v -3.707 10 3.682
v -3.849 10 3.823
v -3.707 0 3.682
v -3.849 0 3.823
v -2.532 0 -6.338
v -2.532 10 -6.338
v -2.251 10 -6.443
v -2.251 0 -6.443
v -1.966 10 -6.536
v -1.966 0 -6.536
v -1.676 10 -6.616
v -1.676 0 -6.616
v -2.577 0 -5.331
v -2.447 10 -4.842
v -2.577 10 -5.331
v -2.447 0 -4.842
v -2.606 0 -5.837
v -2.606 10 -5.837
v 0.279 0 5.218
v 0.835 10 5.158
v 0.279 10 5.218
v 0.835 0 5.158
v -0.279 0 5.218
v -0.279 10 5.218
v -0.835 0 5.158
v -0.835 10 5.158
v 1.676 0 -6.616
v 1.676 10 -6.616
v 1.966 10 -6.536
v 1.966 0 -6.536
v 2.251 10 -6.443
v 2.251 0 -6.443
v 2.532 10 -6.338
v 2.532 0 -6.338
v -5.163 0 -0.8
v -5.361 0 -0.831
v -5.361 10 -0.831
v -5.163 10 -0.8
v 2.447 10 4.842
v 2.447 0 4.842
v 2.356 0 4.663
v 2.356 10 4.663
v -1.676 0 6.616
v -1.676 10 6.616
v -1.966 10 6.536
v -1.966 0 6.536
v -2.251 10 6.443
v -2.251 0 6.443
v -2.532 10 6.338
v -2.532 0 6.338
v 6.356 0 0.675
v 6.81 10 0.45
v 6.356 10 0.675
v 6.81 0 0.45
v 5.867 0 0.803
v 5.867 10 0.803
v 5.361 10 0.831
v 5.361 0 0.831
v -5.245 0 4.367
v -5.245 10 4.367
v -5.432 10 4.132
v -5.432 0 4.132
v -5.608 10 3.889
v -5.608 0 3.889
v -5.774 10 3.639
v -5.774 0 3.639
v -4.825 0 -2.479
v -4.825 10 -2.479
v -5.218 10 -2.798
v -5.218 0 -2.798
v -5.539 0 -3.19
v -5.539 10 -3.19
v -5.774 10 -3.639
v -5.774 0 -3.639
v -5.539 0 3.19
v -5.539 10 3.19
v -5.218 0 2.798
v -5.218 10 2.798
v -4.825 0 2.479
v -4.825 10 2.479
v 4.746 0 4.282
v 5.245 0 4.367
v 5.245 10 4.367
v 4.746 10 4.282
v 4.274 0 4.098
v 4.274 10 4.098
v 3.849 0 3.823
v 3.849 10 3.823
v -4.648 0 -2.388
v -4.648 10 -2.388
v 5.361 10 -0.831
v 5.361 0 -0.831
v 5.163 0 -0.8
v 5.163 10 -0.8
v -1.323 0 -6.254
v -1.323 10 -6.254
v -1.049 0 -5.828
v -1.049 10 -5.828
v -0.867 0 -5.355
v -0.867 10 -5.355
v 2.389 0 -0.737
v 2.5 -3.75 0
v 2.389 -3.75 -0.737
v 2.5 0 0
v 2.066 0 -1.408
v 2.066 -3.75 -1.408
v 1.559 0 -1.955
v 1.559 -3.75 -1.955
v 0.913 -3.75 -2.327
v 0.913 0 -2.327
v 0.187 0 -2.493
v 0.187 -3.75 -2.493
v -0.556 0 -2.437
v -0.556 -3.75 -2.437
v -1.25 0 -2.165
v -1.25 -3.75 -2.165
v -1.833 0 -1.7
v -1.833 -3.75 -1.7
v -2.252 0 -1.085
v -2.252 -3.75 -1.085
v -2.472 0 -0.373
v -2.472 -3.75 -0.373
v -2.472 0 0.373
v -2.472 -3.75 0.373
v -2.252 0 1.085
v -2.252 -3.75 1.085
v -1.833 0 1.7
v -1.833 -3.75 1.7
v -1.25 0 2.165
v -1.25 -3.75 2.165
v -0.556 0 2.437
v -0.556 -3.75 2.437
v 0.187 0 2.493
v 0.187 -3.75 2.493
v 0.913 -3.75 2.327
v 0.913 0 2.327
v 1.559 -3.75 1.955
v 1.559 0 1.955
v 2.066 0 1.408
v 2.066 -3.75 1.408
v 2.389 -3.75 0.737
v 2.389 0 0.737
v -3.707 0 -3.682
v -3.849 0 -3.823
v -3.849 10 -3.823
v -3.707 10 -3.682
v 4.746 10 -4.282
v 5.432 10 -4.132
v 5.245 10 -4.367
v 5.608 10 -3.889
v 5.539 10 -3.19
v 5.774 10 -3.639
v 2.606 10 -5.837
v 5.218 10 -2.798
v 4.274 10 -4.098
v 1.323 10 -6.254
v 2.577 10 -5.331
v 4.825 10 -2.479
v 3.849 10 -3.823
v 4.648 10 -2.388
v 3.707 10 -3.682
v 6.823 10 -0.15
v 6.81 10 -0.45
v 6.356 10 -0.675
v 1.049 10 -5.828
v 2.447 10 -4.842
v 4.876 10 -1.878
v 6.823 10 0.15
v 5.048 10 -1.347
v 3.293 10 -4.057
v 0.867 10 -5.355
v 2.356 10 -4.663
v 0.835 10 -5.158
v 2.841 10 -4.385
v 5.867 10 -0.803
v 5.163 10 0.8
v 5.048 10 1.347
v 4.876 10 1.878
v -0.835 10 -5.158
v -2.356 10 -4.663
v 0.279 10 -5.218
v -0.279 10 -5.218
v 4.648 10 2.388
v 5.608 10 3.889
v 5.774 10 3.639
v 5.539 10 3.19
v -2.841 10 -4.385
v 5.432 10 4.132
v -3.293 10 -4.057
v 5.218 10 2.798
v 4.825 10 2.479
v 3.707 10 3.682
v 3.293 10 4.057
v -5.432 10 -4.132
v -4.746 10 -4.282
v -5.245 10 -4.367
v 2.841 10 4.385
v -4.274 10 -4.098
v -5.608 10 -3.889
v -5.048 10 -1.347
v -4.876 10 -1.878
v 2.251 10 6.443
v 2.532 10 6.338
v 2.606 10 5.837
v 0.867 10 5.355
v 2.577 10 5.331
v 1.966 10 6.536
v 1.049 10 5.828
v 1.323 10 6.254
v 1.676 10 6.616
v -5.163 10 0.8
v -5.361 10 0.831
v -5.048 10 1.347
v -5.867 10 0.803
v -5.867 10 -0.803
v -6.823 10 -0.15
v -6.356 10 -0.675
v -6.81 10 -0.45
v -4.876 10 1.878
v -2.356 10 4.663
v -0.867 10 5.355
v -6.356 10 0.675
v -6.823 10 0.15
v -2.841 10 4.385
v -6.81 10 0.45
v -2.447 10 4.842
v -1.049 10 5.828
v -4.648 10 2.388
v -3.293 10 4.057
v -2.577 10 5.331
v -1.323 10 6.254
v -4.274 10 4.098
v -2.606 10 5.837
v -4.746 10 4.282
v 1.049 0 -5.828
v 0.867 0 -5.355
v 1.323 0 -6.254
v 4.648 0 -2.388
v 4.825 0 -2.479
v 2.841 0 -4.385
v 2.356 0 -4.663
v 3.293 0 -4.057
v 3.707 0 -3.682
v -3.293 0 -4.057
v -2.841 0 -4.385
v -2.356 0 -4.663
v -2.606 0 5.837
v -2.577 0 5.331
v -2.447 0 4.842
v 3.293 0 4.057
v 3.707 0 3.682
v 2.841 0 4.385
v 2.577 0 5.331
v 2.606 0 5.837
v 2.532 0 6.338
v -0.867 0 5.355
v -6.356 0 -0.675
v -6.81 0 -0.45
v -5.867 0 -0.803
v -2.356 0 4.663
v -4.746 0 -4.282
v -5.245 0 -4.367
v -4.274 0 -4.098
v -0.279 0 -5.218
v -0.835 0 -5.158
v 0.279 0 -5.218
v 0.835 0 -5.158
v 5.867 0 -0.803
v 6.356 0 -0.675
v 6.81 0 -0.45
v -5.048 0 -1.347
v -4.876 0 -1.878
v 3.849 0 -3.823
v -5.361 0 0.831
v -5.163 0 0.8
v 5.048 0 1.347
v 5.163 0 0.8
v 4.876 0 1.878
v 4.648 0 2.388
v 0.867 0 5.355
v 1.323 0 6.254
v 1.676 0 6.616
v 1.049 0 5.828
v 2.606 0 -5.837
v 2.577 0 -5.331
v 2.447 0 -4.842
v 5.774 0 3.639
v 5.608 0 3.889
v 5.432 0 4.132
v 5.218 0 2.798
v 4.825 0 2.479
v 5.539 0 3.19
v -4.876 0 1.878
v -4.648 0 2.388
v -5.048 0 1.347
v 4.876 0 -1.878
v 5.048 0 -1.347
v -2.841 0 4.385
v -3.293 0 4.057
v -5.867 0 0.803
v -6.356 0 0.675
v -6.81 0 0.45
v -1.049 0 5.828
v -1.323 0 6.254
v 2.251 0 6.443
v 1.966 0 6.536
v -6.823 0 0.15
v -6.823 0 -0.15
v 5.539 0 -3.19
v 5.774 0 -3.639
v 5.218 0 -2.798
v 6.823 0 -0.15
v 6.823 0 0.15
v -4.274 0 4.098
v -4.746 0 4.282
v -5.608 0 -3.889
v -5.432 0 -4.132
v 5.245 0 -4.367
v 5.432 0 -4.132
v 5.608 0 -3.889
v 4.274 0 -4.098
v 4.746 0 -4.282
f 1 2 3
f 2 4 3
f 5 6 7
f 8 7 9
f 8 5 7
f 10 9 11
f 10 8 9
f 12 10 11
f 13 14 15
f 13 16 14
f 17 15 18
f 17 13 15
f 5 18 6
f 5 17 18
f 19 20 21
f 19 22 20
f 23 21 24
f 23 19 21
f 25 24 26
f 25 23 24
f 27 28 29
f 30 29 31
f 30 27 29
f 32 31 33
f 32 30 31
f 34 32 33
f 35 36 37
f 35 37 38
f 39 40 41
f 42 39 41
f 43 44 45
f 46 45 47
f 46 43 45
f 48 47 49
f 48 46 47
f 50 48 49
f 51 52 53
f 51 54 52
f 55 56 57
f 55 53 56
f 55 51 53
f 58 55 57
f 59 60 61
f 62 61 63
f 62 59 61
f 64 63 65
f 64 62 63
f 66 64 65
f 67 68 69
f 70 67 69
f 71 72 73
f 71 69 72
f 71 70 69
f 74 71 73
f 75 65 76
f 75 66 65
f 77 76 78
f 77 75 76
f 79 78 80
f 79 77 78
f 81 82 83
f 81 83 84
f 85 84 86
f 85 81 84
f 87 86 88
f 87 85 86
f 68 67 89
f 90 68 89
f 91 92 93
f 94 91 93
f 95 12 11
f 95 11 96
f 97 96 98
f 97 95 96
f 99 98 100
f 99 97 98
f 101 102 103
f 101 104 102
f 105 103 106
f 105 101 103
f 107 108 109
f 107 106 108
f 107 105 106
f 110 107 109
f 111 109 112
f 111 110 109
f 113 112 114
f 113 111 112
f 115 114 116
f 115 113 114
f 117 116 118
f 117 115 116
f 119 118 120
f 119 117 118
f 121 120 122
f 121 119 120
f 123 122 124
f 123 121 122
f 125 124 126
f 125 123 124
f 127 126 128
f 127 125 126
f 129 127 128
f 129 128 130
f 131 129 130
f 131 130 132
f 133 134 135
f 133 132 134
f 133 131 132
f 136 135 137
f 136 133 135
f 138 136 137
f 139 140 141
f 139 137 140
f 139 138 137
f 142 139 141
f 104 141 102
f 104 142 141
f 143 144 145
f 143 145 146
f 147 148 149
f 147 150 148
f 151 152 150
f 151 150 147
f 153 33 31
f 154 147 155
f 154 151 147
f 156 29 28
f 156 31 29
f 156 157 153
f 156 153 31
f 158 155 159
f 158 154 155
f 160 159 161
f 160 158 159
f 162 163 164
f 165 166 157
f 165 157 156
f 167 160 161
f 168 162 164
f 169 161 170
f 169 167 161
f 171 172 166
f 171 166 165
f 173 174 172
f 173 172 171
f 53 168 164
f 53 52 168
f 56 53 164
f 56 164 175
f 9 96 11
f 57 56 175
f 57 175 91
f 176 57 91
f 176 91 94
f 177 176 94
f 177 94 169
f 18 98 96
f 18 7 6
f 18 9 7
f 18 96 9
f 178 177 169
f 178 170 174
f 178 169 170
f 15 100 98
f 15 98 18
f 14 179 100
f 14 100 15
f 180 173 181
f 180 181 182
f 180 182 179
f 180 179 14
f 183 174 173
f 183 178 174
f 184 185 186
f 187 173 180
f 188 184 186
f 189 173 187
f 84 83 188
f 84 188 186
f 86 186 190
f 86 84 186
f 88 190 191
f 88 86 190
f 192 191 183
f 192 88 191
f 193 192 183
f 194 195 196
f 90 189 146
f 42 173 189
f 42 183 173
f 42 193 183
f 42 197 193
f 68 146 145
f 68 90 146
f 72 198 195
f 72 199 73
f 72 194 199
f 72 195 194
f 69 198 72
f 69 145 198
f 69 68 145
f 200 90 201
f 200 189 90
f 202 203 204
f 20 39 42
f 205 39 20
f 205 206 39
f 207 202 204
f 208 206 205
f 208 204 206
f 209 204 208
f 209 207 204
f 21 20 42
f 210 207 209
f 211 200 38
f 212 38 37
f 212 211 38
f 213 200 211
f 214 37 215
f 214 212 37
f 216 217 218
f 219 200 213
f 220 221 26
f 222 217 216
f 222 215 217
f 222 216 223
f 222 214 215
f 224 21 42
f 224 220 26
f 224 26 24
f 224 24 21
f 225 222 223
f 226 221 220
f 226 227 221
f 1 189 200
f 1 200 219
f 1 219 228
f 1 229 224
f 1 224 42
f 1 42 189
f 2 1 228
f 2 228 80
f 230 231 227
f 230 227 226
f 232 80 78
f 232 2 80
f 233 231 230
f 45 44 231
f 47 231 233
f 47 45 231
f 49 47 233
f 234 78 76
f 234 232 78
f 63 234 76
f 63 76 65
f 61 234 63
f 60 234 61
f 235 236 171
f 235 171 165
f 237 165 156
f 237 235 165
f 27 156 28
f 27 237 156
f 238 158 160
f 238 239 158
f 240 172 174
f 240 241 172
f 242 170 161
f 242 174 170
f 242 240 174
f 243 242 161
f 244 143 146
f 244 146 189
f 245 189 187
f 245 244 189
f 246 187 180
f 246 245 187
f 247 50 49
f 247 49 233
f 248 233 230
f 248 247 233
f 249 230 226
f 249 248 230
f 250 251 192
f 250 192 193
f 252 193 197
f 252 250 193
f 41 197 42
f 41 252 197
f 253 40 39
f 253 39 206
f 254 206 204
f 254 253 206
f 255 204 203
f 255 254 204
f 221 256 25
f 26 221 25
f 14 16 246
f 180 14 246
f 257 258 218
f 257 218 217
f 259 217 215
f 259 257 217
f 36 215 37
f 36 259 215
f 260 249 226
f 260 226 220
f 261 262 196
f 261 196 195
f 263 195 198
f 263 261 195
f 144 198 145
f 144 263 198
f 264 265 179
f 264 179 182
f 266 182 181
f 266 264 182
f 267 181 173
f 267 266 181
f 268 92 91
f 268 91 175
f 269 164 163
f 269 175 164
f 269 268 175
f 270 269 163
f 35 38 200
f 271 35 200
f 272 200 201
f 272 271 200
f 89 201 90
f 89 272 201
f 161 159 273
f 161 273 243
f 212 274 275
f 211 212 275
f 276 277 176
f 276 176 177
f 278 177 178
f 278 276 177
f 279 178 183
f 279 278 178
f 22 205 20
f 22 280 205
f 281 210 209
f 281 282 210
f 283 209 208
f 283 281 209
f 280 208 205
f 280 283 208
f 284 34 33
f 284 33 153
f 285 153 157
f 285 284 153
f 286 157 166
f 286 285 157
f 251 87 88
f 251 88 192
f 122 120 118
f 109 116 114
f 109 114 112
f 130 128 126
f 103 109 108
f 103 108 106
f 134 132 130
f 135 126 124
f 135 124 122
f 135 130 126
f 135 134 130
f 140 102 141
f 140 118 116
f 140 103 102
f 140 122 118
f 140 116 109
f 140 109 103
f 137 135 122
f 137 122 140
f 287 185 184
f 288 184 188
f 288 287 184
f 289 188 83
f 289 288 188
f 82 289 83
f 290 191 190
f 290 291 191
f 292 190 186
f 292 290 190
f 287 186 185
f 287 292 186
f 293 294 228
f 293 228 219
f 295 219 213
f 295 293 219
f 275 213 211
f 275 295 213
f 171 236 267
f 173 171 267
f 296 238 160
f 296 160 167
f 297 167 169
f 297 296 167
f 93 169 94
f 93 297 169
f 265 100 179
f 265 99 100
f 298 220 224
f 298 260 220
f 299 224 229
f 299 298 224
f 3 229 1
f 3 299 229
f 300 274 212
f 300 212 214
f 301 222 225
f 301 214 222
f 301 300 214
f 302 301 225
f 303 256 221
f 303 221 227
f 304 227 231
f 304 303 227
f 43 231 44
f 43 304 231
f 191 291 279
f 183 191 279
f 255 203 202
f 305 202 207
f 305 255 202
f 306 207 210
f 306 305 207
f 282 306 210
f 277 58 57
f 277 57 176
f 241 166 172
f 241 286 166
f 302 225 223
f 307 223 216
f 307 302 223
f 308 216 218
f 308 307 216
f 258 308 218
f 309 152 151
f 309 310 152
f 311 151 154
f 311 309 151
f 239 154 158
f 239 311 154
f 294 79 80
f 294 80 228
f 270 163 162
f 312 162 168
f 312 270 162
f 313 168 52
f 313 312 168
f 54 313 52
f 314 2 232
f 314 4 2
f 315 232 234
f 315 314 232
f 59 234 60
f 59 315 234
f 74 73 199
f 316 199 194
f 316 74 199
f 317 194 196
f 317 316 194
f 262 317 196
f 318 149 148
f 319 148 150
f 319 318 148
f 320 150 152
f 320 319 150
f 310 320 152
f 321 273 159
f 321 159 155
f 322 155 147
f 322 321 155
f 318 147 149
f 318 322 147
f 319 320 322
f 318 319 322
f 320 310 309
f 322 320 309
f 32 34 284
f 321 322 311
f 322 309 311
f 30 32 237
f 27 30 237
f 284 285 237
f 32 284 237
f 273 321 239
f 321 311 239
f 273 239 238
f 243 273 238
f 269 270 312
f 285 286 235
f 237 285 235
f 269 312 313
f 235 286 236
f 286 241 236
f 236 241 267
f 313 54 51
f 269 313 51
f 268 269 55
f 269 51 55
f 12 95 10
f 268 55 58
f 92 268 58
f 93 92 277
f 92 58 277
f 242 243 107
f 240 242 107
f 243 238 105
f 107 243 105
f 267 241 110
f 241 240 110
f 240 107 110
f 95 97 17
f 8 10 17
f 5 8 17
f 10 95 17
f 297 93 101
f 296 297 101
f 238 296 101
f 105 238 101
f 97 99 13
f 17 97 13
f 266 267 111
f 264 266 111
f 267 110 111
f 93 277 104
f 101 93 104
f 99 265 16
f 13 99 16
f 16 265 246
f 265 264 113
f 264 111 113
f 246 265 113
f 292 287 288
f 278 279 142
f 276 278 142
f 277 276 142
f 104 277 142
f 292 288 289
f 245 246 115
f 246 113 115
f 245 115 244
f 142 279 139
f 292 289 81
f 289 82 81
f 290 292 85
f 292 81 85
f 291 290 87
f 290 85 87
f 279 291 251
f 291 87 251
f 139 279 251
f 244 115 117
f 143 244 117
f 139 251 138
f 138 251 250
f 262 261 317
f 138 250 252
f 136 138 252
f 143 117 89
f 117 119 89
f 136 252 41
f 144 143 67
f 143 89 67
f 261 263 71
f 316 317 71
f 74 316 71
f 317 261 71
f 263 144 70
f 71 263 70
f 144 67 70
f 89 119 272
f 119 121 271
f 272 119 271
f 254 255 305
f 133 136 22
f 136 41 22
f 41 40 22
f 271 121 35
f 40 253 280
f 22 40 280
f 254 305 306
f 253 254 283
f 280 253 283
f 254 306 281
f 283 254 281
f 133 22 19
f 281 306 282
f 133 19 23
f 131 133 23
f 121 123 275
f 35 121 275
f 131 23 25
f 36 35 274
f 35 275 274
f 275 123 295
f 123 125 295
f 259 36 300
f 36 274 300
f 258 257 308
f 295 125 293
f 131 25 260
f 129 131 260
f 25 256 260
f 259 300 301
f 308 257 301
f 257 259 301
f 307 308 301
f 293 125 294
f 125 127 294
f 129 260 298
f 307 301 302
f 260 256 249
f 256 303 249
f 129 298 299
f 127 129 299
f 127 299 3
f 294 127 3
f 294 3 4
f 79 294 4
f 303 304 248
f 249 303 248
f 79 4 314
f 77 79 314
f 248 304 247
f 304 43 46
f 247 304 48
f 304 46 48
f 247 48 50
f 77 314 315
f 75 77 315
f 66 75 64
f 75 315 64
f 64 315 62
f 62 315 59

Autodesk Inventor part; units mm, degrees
ref_plane "YZ Plane" through (0, 0, 0) normal (1, 0, 0) x (0, 1, 0)
ref_plane "XZ Plane" through (0, 0, 0) normal (0, 1, 0) x (-1, 0, 0)
ref_plane "XY Plane" through (0, 0, 0) normal (0, 0, 1) x (1, 0, 0)
sketch "Sketch1" plane through (0, 0, 0) normal (0, 1, 0) x (-1, 0, 0)
  circle A0 centre (0, 0) radius 6.125 construction
  circle A1 centre (0, 0) radius 6.825
  circle A2 centre (0, 0) radius 5.225
  circle A3 centre (0, 0) radius 5.425 construction
  line L0 (0, 0) -> (5.225, 0) construction
  line L1 (6.825, 0) -> (5.1994, 0) construction
  line L2 (6.125, 0) -> (6.825, 0) construction
  line L3 (5.425, 0) -> (6.125, 0) construction
  line L4 (5.225, 0) -> (5.425, 0) construction
  line L5 (5.361, -0.8306) -> (5.1634, -0.8)
  arc A4 (5.361, -0.8306) -> (6.8101, -0.45) centre (5.4797, 1.6666) ccw
  line L6 (5.361, 0.8306) -> (5.1634, 0.8)
  arc A5 (6.8101, 0.45) -> (5.361, 0.8306) centre (5.4797, -1.6666) ccw
  point P0 (5.1634, 0.8)
  point P1 (6.8101, 0.45)
  dimension "d0" = 12.25
  dimension "d1" = 0.7
  dimension "d2" = 0.7
  dimension "d3" = 0.2
  dimension "d4" = 0.8
  dimension "d5" = 2.5
  dimension "d6" = 0.45
extrude "Extrusion1" add sketch "Sketch1" along normal blind 10 contours A1 A4 L5 A2 L6 A5 | A2 picked at (5.9792, 0)
pattern_circular "Circular Pattern1" count 10 over 360 about axis through (0, 0, 0) along (0, 1, 0) of "Extrusion1"
sketch "Sketch3" plane through (0, 0, 0) normal (0, -1, 0) x (1, 0, 0)
  arc A0 (-4.6475, 2.3878) -> (-5.1634, 0.8) centre (0, 0) ccw construction
  circle A1 centre (0, 0) radius 2.5
  dimension "d13" = 5
extrude "Extrusion2" add sketch "Sketch3" along normal blind 3.75
properties part number "planeta_V2"
